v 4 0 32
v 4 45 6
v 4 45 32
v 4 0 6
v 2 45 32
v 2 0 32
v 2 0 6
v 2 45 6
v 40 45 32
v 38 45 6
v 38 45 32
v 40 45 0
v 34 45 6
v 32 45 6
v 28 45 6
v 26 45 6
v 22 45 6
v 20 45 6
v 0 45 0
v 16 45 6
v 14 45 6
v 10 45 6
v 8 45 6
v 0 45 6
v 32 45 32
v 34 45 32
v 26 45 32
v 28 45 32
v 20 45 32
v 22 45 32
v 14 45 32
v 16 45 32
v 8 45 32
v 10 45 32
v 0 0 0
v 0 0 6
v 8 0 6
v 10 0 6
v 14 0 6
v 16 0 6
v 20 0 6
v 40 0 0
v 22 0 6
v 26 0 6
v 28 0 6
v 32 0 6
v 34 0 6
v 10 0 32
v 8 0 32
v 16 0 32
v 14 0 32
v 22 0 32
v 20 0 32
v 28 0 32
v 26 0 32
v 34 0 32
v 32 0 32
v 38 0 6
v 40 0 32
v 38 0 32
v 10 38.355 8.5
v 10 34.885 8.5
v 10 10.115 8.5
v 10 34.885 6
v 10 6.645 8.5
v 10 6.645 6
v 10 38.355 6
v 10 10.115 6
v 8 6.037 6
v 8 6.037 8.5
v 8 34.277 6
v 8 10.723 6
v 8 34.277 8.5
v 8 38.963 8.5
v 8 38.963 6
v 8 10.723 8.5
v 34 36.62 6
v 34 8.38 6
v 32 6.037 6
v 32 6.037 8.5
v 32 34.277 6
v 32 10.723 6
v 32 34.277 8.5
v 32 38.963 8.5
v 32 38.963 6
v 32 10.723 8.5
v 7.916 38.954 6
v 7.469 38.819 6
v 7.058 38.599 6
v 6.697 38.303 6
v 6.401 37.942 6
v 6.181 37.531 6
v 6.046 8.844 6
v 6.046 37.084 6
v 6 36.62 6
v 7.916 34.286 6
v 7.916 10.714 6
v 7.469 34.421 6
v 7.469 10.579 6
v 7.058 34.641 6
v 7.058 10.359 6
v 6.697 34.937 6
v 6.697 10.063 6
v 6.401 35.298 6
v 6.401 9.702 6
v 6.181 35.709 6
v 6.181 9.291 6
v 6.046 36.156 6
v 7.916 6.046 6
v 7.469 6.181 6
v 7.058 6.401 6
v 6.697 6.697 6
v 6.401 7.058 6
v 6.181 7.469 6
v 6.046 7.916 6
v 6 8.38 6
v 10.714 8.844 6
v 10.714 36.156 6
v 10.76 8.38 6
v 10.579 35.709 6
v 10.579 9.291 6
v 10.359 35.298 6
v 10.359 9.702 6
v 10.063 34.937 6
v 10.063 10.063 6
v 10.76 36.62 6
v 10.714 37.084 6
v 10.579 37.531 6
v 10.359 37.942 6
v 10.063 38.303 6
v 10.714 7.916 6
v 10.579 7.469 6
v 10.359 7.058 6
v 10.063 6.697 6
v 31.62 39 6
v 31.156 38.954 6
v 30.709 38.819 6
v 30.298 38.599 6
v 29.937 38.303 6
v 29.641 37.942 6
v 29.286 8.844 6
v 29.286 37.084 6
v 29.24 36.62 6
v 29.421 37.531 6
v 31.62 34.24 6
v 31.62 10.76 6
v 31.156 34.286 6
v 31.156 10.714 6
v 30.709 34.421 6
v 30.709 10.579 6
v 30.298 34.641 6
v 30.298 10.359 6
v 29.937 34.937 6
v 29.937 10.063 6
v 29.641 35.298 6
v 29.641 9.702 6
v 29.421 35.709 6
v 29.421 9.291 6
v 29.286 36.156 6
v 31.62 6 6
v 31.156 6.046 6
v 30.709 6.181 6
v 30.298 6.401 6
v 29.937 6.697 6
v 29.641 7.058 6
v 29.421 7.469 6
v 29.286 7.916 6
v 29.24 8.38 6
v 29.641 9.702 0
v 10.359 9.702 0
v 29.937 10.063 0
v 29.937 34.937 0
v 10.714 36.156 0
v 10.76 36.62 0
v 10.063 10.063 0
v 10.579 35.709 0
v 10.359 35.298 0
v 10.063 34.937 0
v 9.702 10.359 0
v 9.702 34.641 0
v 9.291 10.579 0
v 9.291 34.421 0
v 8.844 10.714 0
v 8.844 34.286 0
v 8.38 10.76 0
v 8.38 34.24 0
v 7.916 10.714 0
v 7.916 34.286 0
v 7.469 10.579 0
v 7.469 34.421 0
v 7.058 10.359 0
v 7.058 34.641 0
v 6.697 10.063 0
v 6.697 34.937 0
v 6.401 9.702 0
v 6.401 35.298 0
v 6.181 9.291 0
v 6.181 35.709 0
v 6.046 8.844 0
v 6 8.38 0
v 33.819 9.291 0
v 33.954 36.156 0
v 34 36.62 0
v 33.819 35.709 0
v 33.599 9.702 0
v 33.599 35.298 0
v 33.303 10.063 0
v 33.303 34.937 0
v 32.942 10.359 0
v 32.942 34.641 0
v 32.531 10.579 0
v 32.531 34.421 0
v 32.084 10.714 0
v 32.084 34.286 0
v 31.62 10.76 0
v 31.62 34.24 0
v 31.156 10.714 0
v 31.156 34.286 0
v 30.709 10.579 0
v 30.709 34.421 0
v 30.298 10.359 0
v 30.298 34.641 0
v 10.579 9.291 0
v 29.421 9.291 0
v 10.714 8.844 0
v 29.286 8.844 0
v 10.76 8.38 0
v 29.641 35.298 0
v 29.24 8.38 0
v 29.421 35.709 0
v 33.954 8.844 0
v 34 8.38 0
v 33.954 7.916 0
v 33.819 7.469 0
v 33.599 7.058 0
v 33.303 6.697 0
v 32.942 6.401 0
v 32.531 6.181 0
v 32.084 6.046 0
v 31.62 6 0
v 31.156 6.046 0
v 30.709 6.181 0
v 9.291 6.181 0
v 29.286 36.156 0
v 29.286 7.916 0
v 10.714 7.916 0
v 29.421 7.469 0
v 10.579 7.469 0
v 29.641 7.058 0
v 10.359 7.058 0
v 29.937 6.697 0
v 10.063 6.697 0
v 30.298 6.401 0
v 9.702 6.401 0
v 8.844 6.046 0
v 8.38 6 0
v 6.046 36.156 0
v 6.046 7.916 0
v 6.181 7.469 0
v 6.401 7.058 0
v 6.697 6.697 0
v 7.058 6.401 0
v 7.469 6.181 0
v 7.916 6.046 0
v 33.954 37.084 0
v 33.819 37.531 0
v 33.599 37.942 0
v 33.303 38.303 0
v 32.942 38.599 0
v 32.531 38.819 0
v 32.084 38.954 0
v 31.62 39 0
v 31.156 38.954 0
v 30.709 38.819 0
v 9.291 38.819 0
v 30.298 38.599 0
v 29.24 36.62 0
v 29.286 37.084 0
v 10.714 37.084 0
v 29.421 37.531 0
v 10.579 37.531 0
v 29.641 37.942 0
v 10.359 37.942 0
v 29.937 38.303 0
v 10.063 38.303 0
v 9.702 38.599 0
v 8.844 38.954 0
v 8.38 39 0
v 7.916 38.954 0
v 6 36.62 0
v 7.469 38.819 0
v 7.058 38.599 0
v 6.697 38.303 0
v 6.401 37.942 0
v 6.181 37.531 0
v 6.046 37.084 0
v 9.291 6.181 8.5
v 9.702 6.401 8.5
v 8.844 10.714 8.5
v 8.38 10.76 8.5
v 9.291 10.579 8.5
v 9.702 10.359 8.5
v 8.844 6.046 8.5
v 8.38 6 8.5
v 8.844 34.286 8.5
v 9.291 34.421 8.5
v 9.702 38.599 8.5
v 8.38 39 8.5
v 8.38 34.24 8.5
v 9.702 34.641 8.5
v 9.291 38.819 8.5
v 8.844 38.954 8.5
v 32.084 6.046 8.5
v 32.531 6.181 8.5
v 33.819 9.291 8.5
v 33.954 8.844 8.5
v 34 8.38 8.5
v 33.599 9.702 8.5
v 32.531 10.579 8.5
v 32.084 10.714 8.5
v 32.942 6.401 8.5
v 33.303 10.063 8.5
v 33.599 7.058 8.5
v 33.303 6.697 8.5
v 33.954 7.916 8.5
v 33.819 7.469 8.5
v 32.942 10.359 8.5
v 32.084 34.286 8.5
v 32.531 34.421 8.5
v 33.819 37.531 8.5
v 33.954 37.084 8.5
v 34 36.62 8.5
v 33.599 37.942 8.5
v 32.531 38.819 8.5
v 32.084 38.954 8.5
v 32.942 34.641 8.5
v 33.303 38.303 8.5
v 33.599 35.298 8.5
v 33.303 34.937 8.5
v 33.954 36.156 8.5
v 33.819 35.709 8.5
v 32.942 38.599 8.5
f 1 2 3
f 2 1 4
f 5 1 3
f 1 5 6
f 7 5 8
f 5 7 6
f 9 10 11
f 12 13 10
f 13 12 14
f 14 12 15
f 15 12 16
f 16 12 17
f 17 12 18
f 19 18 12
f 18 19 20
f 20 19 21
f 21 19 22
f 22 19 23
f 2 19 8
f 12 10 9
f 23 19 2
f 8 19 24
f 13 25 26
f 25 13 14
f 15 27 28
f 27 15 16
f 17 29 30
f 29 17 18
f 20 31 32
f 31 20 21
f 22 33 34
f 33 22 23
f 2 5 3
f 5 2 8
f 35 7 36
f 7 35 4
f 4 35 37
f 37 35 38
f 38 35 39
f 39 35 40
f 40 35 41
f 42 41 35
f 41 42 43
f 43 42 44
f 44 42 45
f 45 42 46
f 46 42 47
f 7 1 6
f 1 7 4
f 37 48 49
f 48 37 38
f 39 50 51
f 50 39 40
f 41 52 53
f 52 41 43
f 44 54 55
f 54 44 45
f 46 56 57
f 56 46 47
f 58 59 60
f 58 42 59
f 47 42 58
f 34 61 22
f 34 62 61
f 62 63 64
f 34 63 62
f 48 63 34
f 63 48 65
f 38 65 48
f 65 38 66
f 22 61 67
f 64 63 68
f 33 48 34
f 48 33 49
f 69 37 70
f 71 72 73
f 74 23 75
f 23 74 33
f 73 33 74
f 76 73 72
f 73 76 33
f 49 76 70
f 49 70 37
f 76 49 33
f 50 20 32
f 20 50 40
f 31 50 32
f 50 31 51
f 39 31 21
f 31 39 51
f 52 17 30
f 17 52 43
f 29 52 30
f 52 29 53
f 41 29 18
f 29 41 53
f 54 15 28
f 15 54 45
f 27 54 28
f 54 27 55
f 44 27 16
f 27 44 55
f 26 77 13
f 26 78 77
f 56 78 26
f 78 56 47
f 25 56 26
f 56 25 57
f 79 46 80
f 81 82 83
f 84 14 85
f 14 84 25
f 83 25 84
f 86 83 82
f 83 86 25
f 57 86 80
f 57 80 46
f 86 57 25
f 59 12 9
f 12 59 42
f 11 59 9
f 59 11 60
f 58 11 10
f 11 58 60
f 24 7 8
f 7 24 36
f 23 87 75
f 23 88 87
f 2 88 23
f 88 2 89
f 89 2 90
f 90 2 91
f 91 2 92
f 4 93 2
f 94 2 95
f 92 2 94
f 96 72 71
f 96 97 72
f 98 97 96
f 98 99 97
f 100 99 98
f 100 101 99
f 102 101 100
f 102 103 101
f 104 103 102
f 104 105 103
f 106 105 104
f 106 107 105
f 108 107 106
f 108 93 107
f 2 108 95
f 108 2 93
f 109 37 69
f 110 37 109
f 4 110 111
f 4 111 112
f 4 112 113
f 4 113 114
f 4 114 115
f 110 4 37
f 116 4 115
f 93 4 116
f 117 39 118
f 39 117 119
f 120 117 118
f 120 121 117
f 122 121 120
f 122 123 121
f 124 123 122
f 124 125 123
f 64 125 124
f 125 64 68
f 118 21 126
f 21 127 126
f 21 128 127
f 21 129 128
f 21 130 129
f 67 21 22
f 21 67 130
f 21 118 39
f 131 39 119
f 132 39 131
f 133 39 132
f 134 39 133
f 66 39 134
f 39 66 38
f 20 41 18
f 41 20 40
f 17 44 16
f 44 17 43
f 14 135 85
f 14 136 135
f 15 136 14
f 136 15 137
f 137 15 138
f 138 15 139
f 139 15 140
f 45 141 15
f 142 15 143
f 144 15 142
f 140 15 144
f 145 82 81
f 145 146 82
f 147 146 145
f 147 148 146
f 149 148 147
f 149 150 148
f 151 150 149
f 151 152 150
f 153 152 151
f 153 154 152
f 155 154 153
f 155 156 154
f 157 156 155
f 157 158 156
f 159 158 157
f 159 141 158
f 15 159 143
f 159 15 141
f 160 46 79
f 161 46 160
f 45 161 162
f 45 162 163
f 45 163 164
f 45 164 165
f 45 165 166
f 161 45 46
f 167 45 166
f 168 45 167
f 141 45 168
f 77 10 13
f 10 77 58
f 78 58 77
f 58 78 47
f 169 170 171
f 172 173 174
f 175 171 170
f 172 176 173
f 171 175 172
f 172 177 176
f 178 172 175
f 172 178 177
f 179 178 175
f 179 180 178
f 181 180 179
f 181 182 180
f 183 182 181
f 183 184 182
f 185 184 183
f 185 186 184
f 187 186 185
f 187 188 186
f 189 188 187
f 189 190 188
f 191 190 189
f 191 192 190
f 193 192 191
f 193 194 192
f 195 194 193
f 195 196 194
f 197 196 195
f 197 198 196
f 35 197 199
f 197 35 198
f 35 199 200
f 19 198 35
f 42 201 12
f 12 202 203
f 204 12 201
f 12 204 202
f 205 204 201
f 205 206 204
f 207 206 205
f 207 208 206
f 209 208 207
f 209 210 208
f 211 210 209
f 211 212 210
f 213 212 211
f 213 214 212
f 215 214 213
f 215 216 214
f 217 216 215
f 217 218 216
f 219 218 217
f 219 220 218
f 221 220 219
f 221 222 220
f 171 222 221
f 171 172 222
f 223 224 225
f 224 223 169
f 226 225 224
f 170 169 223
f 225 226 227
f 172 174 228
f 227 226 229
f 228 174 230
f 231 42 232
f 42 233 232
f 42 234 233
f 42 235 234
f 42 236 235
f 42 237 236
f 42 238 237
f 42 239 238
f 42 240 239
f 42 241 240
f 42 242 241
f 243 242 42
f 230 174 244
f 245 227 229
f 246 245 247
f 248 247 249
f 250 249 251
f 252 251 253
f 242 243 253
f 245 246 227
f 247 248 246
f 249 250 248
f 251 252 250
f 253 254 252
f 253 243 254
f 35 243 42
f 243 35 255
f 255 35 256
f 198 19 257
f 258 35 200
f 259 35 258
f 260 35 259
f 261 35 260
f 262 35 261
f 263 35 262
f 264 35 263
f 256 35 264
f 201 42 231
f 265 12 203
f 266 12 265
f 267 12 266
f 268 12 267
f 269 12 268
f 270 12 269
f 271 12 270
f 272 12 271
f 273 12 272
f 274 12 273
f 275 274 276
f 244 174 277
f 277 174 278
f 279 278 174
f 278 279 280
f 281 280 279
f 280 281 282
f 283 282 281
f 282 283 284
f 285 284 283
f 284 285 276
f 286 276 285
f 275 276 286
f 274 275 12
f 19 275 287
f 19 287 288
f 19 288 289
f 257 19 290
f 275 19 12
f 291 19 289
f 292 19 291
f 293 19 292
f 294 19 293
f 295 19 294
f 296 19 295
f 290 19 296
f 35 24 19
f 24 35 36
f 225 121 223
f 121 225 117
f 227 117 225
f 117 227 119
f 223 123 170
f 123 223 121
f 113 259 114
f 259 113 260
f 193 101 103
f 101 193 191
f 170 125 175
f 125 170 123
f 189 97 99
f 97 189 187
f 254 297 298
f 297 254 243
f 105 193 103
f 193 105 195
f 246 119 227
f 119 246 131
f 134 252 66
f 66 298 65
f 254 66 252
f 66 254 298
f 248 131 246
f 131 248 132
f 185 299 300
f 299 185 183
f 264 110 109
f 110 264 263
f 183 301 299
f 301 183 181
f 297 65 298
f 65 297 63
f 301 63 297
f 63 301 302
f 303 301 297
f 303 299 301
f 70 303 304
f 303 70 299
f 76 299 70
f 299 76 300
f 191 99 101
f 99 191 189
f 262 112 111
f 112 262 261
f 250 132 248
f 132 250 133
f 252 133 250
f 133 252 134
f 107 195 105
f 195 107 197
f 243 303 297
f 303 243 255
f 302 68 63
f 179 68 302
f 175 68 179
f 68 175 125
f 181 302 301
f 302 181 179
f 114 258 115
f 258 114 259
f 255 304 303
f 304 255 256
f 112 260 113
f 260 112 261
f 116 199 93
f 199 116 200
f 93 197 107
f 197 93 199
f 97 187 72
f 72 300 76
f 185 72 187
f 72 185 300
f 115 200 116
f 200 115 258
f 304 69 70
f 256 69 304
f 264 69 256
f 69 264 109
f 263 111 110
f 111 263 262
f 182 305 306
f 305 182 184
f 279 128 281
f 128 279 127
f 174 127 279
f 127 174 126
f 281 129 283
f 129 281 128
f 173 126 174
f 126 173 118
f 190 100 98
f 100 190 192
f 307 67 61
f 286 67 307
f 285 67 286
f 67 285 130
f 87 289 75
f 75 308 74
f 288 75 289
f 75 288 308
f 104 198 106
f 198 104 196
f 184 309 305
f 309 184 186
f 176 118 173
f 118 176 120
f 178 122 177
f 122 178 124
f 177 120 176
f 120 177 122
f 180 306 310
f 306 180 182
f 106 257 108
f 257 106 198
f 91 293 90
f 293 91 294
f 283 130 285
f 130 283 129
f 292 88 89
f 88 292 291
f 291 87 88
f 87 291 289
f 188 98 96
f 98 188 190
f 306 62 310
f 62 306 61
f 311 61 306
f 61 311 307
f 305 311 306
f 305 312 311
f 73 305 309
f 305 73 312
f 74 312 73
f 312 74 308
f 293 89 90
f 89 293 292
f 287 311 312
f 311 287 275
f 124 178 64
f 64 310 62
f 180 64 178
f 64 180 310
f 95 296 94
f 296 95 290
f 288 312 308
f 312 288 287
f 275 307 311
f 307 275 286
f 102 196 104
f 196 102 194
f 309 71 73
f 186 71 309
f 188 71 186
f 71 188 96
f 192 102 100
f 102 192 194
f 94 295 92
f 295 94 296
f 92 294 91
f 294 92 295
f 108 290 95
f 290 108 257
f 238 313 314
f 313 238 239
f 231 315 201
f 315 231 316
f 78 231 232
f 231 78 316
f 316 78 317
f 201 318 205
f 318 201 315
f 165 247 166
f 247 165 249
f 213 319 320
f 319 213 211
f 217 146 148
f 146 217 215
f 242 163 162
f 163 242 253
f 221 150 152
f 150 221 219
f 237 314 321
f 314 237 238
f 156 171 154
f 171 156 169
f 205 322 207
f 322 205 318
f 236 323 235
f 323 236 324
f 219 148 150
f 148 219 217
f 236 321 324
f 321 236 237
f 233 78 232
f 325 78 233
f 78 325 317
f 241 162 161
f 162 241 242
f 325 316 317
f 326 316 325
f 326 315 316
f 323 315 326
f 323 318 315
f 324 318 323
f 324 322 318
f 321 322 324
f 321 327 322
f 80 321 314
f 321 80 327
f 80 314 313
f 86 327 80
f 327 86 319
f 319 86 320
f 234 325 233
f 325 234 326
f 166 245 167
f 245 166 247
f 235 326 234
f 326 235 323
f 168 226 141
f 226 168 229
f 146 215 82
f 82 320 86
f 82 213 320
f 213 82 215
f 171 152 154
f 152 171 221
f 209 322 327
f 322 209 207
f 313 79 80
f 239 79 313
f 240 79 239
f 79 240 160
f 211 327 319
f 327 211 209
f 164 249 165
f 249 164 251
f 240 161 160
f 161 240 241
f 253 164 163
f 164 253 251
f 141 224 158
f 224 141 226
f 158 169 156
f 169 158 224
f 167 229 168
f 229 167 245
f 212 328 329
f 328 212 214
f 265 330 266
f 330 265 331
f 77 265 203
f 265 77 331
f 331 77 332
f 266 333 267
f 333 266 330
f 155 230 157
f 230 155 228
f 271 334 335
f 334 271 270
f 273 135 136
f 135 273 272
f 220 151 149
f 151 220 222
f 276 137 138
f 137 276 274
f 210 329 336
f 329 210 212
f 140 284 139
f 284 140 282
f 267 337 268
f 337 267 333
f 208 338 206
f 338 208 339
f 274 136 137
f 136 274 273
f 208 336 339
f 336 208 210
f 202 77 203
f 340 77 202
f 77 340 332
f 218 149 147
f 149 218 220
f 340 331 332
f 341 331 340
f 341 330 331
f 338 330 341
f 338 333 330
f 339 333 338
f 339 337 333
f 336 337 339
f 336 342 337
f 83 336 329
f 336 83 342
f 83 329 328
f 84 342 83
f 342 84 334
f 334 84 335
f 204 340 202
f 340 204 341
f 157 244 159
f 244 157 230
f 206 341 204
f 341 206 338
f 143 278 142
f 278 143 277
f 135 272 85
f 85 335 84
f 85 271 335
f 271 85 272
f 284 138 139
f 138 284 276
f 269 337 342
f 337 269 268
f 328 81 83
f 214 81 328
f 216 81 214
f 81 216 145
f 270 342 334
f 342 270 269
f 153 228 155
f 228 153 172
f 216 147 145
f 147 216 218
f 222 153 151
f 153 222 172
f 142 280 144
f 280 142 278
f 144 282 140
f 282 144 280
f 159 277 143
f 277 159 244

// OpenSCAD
$fn = 32;

// ----------------------------------------------------------------------
// Finned heat sink: 40 x 45 mm base, 26 mm fins
// ----------------------------------------------------------------------

// --- parameters (mm) ---
base_w = 40;              // base width
base_d = 45;              // base depth
base_t = 6;               // base thickness
fin_h = 26;               // fin height above the base
holes_d = 4.76;           // fixing holes
hole_x = 11.62;           // hole offset in x
hole_y = 14.12;           // hole offset in y
fin_t = 2;                // fin thickness
fin_pitch = 6;            // fin pitch
fin_count = 7;            // number of fins
fin_x0 = 2;               // first fin offset

difference() {
  union() {
    cube([base_w, base_d, base_t]);
    for (i = [0 : fin_count - 1]) {
      translate([fin_x0 + i * fin_pitch, 0, base_t - 0.5]) cube([fin_t, base_d, fin_h + 0.5]);
    }
  }
  /* fixing holes through the base, 2.5 mm clear on both sides */
  for (hx = [-11.62, 11.62]) {
    for (hy = [-14.12, 14.12]) {
      translate([base_w / 2 + hx, base_d / 2 + hy, -2.5]) cylinder(h = base_t + 5, d = holes_d);
    }
  }
}
